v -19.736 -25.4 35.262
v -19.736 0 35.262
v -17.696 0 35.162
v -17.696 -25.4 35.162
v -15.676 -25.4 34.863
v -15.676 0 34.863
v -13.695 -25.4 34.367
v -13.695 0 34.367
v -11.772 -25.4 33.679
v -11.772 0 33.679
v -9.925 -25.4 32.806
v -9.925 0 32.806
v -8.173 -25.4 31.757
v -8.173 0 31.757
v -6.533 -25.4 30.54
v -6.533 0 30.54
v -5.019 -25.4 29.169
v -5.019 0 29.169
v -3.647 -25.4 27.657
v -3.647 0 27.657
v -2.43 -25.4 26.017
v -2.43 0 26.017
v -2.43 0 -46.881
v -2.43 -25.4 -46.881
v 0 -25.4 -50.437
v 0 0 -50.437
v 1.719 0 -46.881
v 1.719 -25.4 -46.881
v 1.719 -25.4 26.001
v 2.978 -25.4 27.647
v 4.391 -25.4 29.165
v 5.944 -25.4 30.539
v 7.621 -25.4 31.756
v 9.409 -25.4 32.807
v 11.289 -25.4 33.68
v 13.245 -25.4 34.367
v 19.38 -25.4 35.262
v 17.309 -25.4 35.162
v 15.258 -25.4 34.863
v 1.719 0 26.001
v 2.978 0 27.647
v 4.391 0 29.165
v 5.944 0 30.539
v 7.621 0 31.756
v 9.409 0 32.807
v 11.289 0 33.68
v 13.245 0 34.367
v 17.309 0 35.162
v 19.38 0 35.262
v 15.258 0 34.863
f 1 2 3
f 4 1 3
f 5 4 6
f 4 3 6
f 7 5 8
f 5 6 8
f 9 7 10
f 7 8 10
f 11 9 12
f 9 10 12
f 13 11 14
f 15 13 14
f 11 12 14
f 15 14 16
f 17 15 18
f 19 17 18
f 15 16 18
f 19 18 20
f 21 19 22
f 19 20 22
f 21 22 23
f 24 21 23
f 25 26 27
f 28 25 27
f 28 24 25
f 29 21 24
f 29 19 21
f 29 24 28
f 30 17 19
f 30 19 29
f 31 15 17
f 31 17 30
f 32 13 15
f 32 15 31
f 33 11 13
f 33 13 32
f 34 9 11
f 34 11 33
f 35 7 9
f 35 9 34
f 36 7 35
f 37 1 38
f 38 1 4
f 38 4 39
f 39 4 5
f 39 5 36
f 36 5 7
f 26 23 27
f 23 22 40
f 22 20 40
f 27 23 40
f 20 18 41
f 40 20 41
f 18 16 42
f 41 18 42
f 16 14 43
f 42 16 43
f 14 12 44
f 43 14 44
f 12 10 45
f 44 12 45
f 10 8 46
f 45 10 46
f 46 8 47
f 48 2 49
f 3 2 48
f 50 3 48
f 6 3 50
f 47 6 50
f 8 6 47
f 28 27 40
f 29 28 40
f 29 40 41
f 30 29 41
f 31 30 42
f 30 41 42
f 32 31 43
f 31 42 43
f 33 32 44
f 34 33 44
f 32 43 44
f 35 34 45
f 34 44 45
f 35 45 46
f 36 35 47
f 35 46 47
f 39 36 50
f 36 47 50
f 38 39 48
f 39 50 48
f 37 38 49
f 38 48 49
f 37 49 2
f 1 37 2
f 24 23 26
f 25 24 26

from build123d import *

# Parameters (mm, degrees)
F1_DEPTH = 25.4


# Not quite as in the source:
# - ends of sketch curves that miss each other by under 0.0002 mm in the source are joined


with BuildPart() as f1:
    # F0 (on Front) → F1 (new body)
    with BuildSketch(Plane.XZ):
        Polygon((-2.4299337529, 26.016831398), (-2.4299337529, -46.8811690807), (1.718732994, -46.8811690807), (1.718732994, 26.0008927435), (1.7185925992, 26.0008932828), align=None)
        Polygon((1.718732994, -46.8811690807), (-2.4299337529, -46.8811690807), (0, -50.4371710122), align=None)
        with BuildLine():
            ThreePointArc((-19.7358001024, 35.2624356747), (-9.9254202862, 32.8061351822), (-2.4299337529, 26.016831398))
            Line((-2.4299337529, 26.016831398), (1.7185925992, 26.0008932828))
            ThreePointArc((1.7185925992, 26.0008932828), (9.4088856226, 32.8066016945), (19.3802025169, 35.2624356747))
            Line((19.3802025169, 35.2624356747), (-19.7358001024, 35.2624356747))
        make_face()
    extrude(amount=F1_DEPTH)


solid = f1.part
